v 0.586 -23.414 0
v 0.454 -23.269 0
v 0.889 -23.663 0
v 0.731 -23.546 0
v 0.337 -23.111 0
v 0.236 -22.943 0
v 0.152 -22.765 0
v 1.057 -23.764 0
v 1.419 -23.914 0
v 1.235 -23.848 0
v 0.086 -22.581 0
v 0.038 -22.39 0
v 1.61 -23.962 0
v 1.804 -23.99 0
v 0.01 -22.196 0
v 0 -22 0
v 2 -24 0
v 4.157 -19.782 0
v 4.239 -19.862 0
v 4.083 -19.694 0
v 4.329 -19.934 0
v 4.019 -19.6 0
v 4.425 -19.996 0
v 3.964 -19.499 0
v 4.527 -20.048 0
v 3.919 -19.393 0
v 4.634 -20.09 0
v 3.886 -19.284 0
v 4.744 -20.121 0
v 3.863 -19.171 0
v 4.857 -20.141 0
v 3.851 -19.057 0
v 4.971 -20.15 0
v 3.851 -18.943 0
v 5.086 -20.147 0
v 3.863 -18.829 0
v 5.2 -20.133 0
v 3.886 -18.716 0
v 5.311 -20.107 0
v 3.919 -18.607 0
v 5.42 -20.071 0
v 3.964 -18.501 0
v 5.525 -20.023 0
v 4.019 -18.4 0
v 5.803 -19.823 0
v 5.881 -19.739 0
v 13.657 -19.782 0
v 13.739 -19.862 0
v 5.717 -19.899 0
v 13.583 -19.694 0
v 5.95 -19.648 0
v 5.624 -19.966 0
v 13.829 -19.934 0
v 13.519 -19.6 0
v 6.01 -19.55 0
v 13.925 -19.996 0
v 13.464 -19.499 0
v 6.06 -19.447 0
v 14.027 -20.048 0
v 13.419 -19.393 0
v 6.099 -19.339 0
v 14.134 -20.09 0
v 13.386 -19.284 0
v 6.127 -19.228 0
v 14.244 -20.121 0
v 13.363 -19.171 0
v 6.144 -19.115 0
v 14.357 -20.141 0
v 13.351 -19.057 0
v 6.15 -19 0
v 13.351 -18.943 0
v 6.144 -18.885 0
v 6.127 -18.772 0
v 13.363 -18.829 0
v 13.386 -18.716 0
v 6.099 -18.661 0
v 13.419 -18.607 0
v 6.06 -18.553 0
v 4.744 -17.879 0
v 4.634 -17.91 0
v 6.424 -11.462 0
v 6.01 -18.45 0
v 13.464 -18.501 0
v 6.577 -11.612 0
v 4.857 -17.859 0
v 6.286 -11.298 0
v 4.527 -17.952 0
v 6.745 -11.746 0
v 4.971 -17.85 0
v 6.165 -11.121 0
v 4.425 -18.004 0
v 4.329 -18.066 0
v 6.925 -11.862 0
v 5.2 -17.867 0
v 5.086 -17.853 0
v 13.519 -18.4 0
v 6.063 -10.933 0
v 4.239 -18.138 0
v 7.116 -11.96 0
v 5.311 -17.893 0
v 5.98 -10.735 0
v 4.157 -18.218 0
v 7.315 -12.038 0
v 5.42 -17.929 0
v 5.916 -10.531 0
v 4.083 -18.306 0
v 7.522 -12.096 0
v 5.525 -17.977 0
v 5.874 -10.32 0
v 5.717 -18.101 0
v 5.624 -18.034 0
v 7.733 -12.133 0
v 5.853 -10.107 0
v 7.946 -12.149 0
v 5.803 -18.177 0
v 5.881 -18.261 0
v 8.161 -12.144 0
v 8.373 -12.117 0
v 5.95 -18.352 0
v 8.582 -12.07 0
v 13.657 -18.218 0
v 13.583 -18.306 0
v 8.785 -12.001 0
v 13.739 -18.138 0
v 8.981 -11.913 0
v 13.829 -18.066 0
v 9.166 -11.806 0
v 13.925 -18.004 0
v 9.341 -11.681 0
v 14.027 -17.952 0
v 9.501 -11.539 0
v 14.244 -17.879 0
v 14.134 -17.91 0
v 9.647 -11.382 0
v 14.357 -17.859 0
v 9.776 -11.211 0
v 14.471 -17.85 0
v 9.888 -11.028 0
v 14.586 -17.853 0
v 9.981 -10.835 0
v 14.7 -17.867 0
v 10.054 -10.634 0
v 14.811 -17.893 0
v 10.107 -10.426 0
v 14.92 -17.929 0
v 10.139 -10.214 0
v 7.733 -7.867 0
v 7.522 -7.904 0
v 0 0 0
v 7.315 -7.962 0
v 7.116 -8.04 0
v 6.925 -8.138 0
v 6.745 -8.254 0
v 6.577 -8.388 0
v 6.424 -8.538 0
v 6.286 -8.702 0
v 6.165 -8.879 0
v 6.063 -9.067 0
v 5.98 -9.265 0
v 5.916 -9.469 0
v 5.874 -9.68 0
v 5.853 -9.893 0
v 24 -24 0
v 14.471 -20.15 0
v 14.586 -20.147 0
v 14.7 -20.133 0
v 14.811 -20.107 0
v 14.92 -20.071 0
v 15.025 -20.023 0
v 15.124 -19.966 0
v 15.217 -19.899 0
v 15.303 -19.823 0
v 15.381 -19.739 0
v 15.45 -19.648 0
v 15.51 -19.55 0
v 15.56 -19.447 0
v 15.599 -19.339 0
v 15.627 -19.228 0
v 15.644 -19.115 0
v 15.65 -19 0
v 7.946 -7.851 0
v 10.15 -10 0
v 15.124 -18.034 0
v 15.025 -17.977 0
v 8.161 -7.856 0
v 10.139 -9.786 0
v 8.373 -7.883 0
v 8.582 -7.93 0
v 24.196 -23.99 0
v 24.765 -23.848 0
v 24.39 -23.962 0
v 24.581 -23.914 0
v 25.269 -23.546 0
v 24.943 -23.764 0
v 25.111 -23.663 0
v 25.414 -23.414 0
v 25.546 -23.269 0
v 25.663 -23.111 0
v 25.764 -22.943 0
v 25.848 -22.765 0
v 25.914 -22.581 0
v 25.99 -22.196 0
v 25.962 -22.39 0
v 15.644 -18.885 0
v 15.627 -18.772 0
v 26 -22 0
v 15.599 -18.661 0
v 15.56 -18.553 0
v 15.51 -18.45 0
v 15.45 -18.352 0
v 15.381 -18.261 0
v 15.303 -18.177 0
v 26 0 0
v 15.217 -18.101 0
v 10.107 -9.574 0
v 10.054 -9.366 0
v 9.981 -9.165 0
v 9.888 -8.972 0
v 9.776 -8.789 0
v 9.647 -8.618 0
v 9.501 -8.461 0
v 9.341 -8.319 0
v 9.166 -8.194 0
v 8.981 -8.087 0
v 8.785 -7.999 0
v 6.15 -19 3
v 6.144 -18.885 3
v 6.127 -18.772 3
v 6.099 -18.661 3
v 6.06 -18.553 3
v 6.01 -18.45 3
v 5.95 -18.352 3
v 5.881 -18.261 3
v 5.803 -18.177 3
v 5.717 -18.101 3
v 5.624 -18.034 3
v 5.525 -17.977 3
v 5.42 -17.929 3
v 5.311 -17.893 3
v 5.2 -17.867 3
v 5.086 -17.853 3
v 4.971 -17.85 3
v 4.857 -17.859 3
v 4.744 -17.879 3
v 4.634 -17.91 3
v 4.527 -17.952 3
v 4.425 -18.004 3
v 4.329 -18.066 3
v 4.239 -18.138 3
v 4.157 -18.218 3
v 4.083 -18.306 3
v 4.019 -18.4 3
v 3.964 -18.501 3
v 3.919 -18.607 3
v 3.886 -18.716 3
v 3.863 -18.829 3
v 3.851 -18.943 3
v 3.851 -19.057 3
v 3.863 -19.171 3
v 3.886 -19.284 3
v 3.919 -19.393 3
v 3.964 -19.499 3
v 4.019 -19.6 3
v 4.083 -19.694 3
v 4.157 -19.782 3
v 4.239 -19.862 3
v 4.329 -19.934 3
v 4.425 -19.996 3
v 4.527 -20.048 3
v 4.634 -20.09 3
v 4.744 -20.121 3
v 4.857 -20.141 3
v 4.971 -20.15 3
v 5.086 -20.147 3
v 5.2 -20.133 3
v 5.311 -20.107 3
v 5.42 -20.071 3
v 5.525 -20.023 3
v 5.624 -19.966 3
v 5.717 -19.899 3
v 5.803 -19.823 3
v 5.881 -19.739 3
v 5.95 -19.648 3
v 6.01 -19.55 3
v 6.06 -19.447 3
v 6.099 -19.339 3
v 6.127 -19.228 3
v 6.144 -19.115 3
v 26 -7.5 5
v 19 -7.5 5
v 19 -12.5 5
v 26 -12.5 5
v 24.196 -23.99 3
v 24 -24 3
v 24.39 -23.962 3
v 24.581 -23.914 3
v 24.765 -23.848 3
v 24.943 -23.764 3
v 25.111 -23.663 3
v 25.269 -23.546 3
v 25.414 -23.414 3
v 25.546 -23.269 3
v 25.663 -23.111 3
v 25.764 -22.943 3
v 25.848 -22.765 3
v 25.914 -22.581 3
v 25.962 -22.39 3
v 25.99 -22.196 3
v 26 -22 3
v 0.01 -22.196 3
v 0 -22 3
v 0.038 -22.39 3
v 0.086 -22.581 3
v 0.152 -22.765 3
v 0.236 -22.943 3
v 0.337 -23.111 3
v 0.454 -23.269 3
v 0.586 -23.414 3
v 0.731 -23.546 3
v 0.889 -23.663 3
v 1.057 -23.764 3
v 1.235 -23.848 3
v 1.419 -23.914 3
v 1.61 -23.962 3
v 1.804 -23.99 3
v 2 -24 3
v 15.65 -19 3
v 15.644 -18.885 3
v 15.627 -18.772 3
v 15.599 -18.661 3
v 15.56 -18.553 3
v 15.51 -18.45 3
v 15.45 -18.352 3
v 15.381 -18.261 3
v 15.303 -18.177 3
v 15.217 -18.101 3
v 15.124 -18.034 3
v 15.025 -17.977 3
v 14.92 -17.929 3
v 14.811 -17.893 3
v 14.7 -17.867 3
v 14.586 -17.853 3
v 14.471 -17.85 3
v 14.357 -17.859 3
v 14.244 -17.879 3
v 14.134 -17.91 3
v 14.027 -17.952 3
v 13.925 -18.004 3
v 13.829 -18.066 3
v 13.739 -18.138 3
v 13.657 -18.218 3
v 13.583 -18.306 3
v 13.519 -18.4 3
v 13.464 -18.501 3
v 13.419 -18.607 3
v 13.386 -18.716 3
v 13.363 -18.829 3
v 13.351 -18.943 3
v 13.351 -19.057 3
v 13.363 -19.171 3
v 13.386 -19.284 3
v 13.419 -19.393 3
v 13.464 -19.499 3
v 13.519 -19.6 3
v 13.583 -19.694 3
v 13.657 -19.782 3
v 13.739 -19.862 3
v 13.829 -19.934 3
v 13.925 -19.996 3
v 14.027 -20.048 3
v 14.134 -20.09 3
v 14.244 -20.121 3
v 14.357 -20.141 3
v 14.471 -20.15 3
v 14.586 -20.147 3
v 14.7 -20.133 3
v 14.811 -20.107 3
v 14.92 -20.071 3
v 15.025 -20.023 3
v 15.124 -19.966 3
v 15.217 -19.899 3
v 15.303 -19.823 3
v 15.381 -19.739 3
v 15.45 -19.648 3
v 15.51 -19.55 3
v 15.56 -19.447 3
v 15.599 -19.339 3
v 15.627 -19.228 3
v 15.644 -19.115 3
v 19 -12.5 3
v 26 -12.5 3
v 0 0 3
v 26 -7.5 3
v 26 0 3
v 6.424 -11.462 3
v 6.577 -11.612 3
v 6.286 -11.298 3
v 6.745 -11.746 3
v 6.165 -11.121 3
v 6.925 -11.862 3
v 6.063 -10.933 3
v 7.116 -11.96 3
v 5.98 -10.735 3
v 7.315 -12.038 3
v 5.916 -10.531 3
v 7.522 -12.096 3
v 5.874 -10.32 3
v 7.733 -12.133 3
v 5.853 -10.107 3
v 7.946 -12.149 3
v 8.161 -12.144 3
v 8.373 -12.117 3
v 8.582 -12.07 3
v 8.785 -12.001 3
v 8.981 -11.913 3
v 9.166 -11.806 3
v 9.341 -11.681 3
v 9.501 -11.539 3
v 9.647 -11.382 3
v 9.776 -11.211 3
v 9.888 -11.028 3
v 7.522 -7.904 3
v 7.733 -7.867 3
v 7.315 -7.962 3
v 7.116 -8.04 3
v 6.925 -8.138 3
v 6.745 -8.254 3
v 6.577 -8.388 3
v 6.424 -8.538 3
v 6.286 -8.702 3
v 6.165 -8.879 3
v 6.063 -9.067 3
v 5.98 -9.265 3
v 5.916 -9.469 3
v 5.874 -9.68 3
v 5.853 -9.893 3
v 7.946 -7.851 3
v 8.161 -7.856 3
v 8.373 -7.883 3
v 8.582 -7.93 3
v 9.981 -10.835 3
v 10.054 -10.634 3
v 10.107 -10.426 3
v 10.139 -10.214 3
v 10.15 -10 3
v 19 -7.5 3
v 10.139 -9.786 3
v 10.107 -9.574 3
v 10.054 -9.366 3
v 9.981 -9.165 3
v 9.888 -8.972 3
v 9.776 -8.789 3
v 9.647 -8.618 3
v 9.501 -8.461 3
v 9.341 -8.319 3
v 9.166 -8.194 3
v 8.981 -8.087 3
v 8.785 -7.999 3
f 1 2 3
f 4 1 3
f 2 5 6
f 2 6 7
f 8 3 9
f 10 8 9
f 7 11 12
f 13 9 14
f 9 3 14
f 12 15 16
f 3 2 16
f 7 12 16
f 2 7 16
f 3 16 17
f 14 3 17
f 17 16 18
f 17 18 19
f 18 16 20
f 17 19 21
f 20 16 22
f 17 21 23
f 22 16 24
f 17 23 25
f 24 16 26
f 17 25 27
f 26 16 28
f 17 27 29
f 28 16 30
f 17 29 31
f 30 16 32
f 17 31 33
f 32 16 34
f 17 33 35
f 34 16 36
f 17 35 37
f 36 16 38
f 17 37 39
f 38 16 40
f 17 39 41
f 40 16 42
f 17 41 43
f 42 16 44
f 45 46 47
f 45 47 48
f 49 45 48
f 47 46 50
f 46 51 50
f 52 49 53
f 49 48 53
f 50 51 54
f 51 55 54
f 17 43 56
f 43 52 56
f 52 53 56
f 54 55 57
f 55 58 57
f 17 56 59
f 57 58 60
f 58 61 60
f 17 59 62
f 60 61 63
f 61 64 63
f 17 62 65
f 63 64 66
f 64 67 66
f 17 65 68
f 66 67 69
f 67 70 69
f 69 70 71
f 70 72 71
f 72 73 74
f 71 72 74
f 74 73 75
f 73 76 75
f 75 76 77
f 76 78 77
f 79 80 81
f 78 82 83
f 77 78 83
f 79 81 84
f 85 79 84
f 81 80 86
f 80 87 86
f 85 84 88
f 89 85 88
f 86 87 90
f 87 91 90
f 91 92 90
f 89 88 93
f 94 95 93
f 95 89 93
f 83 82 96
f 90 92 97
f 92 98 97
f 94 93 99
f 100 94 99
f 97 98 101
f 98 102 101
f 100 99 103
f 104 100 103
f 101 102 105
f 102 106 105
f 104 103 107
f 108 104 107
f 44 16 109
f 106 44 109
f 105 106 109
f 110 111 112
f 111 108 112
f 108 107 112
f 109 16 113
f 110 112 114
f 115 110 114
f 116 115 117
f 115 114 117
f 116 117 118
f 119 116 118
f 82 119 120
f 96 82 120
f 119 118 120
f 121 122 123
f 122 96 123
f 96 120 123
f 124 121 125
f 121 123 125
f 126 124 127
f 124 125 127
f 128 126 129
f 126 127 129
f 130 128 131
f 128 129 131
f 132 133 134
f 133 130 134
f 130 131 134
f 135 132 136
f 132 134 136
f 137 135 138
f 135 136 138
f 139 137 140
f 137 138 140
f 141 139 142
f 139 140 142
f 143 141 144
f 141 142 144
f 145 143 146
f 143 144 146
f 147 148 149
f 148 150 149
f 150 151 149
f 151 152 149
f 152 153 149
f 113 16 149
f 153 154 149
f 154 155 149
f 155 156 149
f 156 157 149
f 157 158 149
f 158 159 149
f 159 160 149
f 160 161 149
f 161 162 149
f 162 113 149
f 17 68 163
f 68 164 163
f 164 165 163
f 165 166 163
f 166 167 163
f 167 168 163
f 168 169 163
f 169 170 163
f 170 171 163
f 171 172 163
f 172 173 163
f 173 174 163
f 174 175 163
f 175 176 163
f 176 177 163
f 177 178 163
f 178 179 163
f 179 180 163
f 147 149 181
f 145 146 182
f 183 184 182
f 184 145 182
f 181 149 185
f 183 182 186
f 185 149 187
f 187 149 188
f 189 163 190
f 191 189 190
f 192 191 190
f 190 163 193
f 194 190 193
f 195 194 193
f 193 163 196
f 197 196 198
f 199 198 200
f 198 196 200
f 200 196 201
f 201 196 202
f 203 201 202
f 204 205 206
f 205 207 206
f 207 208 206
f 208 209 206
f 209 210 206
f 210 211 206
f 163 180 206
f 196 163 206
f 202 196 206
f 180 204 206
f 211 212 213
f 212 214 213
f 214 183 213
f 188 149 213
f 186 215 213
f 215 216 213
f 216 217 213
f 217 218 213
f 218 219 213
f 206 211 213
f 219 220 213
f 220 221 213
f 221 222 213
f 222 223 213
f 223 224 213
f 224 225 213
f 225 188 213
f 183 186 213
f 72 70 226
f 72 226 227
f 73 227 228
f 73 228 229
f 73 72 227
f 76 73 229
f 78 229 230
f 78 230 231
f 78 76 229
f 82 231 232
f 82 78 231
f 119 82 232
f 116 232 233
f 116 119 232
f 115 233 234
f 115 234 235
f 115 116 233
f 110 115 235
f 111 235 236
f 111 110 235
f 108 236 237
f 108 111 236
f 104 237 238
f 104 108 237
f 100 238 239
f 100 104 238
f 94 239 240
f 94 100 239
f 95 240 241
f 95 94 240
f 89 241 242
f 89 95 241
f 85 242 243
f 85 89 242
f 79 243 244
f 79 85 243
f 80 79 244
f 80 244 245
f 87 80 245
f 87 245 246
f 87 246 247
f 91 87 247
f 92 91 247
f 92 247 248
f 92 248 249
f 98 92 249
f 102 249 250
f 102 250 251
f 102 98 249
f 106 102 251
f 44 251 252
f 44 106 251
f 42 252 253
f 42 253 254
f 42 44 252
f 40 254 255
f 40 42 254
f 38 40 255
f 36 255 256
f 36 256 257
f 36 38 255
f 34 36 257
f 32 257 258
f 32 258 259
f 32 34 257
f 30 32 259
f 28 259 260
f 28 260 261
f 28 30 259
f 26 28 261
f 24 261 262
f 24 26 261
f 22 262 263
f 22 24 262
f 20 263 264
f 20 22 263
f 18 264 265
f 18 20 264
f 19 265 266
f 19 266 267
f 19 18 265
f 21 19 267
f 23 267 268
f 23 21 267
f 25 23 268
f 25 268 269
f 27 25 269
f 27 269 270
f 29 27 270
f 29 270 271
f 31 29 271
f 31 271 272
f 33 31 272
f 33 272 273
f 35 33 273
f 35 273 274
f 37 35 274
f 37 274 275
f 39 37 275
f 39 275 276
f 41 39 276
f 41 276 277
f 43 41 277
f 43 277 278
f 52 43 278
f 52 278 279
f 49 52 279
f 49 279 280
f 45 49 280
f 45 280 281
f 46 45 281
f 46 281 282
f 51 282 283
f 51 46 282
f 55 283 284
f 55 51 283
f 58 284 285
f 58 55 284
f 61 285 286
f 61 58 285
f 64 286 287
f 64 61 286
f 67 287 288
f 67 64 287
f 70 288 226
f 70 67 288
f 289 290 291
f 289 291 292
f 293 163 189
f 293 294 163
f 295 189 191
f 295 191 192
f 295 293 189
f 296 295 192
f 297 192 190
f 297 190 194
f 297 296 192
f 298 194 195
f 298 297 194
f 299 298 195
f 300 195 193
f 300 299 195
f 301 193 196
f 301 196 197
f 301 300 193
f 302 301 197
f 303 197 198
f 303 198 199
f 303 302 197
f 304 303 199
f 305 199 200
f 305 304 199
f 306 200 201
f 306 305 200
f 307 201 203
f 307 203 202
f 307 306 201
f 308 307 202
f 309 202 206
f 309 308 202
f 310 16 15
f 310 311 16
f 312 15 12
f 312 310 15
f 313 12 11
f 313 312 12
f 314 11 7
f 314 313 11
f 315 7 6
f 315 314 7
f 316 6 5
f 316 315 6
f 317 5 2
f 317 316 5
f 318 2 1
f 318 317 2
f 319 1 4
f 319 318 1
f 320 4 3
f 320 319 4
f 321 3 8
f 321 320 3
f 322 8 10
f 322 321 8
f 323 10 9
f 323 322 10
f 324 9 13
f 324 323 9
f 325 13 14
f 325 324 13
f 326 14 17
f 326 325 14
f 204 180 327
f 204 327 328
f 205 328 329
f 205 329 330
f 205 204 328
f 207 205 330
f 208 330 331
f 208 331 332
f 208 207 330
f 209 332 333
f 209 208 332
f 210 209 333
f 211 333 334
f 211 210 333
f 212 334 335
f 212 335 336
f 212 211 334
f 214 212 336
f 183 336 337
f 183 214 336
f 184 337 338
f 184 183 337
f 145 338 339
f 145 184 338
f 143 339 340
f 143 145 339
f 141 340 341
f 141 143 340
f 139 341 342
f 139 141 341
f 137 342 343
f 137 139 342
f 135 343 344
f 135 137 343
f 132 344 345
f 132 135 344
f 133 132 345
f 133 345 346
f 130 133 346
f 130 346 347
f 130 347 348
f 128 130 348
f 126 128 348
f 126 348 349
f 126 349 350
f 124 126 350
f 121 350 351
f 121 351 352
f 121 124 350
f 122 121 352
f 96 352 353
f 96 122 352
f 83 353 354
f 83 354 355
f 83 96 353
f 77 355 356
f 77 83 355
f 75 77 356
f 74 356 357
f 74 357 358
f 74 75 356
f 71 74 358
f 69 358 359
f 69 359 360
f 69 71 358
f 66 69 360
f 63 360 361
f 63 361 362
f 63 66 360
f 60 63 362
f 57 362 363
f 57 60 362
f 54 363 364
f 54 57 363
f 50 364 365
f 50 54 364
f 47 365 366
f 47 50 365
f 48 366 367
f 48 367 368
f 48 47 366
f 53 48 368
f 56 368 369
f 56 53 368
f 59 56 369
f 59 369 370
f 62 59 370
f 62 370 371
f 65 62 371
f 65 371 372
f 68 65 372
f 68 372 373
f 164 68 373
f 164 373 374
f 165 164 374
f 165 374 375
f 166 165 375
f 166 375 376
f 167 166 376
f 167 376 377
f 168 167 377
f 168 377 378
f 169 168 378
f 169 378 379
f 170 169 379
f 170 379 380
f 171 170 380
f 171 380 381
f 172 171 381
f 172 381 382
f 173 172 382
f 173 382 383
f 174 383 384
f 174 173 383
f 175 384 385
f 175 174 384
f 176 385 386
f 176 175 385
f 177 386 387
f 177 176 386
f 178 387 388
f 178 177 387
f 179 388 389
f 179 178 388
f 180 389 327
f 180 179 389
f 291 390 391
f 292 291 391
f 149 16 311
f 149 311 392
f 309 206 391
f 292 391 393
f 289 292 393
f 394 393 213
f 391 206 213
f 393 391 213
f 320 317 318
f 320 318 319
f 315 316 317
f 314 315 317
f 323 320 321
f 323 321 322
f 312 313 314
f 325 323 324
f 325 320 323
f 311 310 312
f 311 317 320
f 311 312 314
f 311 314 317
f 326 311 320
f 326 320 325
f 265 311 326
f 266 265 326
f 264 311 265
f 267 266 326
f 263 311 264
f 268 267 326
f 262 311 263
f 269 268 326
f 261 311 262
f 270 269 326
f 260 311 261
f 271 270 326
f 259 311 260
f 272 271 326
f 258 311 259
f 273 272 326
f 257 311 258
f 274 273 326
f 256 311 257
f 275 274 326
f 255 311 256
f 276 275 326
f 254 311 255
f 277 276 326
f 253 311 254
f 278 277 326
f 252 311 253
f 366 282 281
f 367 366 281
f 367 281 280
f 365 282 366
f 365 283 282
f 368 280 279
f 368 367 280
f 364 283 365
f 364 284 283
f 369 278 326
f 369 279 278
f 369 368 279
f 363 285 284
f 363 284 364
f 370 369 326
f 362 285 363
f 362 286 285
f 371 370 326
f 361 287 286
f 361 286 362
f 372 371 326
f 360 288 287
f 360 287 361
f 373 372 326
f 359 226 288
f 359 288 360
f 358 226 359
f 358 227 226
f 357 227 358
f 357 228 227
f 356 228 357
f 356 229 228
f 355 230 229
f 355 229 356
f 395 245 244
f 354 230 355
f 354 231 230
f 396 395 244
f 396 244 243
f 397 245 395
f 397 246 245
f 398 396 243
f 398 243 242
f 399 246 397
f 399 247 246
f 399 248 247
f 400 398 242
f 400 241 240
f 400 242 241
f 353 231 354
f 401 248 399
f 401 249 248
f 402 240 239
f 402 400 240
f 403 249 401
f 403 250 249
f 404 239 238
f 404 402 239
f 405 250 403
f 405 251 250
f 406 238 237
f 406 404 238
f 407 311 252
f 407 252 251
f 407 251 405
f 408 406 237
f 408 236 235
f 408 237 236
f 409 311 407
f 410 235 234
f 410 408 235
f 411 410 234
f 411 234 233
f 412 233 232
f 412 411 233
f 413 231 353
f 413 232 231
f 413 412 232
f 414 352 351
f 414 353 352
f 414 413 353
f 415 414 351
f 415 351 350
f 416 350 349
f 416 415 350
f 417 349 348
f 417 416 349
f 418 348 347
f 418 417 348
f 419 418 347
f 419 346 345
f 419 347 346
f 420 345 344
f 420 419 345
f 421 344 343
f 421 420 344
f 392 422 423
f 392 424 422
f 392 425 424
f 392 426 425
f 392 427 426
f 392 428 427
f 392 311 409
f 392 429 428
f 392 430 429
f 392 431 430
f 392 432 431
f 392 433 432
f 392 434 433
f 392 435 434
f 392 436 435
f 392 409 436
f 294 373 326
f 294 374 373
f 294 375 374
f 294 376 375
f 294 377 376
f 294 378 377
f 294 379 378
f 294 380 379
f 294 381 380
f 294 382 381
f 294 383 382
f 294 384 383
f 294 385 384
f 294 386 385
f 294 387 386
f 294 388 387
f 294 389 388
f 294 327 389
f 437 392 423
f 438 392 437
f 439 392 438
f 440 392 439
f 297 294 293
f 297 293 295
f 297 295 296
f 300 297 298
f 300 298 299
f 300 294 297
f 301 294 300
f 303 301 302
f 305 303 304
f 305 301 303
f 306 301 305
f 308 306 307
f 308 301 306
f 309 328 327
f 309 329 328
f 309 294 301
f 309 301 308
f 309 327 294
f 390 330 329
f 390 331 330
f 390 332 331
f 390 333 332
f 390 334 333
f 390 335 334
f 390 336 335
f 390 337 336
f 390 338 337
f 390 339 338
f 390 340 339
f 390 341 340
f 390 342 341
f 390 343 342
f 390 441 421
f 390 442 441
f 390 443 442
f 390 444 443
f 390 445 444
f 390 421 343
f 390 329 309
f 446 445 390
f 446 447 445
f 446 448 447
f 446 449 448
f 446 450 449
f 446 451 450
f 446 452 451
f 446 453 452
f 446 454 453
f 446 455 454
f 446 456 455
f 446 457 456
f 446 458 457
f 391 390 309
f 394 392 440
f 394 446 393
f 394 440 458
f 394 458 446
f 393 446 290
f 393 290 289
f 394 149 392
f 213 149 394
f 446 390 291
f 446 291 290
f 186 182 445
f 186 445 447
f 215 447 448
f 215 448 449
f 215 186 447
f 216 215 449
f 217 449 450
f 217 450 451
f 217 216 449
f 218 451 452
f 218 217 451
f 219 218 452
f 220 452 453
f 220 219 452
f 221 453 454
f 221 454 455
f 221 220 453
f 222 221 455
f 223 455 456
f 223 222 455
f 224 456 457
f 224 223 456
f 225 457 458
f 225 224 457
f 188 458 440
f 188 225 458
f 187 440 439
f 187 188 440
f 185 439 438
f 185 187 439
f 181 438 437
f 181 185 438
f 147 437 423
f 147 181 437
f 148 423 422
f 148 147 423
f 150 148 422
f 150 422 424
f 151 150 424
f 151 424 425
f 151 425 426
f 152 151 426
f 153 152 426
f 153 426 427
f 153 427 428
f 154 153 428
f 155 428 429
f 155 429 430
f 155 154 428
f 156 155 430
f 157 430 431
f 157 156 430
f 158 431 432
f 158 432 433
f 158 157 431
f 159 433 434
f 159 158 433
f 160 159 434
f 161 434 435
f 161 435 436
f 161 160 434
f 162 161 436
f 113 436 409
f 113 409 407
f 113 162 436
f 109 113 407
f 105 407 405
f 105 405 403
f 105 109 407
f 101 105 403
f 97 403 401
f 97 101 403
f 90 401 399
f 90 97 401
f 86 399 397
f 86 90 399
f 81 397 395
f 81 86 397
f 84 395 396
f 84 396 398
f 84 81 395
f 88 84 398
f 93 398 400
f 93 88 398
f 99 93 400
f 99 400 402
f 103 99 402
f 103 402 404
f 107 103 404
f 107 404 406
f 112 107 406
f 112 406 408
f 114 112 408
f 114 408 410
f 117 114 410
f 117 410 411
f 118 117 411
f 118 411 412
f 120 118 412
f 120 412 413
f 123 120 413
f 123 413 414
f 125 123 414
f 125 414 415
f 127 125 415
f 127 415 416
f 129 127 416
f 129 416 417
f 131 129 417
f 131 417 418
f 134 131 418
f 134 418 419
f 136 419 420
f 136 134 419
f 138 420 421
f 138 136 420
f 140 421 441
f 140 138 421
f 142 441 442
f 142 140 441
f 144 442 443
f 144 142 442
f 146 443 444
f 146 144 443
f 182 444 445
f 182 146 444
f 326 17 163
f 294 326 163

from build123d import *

# Parameters (mm, degrees)
F0_W     = 26
F0_H     = 24
F0_R     = 1.15
F0_R_2   = 2.15
F1_DEPTH = 3
F2_W     = 7
F2_H     = 5
F3_DEPTH = 2
F4_R     = 2


with BuildPart() as f1:
    # F0 (on Top) → F1 (new body)
    with BuildSketch(Plane.XY):
        with Locations((13, -12)):
            Rectangle(F0_W, F0_H)
        with Locations((5, -19)):
            Circle(F0_R, mode=Mode.SUBTRACT)
        with Locations((14.5, -19)):
            Circle(F0_R, mode=Mode.SUBTRACT)
        with Locations((8, -10)):
            Circle(F0_R_2, mode=Mode.SUBTRACT)
    extrude(amount=F1_DEPTH)

    # F2 (on face) → F3 (join)
    with BuildSketch(Plane.XY.offset(3)):
        with Locations((22.5, -10)):
            Rectangle(F2_W, F2_H)
    extrude(amount=F3_DEPTH)

    # F4
    f4_edges = [f1.edges().sort_by_distance(p)[0] for p in [
        (0, -24, 1.5),
        (26, -24, 1.5),
    ]]
    fillet(f4_edges, radius=F4_R)


solid = f1.part
